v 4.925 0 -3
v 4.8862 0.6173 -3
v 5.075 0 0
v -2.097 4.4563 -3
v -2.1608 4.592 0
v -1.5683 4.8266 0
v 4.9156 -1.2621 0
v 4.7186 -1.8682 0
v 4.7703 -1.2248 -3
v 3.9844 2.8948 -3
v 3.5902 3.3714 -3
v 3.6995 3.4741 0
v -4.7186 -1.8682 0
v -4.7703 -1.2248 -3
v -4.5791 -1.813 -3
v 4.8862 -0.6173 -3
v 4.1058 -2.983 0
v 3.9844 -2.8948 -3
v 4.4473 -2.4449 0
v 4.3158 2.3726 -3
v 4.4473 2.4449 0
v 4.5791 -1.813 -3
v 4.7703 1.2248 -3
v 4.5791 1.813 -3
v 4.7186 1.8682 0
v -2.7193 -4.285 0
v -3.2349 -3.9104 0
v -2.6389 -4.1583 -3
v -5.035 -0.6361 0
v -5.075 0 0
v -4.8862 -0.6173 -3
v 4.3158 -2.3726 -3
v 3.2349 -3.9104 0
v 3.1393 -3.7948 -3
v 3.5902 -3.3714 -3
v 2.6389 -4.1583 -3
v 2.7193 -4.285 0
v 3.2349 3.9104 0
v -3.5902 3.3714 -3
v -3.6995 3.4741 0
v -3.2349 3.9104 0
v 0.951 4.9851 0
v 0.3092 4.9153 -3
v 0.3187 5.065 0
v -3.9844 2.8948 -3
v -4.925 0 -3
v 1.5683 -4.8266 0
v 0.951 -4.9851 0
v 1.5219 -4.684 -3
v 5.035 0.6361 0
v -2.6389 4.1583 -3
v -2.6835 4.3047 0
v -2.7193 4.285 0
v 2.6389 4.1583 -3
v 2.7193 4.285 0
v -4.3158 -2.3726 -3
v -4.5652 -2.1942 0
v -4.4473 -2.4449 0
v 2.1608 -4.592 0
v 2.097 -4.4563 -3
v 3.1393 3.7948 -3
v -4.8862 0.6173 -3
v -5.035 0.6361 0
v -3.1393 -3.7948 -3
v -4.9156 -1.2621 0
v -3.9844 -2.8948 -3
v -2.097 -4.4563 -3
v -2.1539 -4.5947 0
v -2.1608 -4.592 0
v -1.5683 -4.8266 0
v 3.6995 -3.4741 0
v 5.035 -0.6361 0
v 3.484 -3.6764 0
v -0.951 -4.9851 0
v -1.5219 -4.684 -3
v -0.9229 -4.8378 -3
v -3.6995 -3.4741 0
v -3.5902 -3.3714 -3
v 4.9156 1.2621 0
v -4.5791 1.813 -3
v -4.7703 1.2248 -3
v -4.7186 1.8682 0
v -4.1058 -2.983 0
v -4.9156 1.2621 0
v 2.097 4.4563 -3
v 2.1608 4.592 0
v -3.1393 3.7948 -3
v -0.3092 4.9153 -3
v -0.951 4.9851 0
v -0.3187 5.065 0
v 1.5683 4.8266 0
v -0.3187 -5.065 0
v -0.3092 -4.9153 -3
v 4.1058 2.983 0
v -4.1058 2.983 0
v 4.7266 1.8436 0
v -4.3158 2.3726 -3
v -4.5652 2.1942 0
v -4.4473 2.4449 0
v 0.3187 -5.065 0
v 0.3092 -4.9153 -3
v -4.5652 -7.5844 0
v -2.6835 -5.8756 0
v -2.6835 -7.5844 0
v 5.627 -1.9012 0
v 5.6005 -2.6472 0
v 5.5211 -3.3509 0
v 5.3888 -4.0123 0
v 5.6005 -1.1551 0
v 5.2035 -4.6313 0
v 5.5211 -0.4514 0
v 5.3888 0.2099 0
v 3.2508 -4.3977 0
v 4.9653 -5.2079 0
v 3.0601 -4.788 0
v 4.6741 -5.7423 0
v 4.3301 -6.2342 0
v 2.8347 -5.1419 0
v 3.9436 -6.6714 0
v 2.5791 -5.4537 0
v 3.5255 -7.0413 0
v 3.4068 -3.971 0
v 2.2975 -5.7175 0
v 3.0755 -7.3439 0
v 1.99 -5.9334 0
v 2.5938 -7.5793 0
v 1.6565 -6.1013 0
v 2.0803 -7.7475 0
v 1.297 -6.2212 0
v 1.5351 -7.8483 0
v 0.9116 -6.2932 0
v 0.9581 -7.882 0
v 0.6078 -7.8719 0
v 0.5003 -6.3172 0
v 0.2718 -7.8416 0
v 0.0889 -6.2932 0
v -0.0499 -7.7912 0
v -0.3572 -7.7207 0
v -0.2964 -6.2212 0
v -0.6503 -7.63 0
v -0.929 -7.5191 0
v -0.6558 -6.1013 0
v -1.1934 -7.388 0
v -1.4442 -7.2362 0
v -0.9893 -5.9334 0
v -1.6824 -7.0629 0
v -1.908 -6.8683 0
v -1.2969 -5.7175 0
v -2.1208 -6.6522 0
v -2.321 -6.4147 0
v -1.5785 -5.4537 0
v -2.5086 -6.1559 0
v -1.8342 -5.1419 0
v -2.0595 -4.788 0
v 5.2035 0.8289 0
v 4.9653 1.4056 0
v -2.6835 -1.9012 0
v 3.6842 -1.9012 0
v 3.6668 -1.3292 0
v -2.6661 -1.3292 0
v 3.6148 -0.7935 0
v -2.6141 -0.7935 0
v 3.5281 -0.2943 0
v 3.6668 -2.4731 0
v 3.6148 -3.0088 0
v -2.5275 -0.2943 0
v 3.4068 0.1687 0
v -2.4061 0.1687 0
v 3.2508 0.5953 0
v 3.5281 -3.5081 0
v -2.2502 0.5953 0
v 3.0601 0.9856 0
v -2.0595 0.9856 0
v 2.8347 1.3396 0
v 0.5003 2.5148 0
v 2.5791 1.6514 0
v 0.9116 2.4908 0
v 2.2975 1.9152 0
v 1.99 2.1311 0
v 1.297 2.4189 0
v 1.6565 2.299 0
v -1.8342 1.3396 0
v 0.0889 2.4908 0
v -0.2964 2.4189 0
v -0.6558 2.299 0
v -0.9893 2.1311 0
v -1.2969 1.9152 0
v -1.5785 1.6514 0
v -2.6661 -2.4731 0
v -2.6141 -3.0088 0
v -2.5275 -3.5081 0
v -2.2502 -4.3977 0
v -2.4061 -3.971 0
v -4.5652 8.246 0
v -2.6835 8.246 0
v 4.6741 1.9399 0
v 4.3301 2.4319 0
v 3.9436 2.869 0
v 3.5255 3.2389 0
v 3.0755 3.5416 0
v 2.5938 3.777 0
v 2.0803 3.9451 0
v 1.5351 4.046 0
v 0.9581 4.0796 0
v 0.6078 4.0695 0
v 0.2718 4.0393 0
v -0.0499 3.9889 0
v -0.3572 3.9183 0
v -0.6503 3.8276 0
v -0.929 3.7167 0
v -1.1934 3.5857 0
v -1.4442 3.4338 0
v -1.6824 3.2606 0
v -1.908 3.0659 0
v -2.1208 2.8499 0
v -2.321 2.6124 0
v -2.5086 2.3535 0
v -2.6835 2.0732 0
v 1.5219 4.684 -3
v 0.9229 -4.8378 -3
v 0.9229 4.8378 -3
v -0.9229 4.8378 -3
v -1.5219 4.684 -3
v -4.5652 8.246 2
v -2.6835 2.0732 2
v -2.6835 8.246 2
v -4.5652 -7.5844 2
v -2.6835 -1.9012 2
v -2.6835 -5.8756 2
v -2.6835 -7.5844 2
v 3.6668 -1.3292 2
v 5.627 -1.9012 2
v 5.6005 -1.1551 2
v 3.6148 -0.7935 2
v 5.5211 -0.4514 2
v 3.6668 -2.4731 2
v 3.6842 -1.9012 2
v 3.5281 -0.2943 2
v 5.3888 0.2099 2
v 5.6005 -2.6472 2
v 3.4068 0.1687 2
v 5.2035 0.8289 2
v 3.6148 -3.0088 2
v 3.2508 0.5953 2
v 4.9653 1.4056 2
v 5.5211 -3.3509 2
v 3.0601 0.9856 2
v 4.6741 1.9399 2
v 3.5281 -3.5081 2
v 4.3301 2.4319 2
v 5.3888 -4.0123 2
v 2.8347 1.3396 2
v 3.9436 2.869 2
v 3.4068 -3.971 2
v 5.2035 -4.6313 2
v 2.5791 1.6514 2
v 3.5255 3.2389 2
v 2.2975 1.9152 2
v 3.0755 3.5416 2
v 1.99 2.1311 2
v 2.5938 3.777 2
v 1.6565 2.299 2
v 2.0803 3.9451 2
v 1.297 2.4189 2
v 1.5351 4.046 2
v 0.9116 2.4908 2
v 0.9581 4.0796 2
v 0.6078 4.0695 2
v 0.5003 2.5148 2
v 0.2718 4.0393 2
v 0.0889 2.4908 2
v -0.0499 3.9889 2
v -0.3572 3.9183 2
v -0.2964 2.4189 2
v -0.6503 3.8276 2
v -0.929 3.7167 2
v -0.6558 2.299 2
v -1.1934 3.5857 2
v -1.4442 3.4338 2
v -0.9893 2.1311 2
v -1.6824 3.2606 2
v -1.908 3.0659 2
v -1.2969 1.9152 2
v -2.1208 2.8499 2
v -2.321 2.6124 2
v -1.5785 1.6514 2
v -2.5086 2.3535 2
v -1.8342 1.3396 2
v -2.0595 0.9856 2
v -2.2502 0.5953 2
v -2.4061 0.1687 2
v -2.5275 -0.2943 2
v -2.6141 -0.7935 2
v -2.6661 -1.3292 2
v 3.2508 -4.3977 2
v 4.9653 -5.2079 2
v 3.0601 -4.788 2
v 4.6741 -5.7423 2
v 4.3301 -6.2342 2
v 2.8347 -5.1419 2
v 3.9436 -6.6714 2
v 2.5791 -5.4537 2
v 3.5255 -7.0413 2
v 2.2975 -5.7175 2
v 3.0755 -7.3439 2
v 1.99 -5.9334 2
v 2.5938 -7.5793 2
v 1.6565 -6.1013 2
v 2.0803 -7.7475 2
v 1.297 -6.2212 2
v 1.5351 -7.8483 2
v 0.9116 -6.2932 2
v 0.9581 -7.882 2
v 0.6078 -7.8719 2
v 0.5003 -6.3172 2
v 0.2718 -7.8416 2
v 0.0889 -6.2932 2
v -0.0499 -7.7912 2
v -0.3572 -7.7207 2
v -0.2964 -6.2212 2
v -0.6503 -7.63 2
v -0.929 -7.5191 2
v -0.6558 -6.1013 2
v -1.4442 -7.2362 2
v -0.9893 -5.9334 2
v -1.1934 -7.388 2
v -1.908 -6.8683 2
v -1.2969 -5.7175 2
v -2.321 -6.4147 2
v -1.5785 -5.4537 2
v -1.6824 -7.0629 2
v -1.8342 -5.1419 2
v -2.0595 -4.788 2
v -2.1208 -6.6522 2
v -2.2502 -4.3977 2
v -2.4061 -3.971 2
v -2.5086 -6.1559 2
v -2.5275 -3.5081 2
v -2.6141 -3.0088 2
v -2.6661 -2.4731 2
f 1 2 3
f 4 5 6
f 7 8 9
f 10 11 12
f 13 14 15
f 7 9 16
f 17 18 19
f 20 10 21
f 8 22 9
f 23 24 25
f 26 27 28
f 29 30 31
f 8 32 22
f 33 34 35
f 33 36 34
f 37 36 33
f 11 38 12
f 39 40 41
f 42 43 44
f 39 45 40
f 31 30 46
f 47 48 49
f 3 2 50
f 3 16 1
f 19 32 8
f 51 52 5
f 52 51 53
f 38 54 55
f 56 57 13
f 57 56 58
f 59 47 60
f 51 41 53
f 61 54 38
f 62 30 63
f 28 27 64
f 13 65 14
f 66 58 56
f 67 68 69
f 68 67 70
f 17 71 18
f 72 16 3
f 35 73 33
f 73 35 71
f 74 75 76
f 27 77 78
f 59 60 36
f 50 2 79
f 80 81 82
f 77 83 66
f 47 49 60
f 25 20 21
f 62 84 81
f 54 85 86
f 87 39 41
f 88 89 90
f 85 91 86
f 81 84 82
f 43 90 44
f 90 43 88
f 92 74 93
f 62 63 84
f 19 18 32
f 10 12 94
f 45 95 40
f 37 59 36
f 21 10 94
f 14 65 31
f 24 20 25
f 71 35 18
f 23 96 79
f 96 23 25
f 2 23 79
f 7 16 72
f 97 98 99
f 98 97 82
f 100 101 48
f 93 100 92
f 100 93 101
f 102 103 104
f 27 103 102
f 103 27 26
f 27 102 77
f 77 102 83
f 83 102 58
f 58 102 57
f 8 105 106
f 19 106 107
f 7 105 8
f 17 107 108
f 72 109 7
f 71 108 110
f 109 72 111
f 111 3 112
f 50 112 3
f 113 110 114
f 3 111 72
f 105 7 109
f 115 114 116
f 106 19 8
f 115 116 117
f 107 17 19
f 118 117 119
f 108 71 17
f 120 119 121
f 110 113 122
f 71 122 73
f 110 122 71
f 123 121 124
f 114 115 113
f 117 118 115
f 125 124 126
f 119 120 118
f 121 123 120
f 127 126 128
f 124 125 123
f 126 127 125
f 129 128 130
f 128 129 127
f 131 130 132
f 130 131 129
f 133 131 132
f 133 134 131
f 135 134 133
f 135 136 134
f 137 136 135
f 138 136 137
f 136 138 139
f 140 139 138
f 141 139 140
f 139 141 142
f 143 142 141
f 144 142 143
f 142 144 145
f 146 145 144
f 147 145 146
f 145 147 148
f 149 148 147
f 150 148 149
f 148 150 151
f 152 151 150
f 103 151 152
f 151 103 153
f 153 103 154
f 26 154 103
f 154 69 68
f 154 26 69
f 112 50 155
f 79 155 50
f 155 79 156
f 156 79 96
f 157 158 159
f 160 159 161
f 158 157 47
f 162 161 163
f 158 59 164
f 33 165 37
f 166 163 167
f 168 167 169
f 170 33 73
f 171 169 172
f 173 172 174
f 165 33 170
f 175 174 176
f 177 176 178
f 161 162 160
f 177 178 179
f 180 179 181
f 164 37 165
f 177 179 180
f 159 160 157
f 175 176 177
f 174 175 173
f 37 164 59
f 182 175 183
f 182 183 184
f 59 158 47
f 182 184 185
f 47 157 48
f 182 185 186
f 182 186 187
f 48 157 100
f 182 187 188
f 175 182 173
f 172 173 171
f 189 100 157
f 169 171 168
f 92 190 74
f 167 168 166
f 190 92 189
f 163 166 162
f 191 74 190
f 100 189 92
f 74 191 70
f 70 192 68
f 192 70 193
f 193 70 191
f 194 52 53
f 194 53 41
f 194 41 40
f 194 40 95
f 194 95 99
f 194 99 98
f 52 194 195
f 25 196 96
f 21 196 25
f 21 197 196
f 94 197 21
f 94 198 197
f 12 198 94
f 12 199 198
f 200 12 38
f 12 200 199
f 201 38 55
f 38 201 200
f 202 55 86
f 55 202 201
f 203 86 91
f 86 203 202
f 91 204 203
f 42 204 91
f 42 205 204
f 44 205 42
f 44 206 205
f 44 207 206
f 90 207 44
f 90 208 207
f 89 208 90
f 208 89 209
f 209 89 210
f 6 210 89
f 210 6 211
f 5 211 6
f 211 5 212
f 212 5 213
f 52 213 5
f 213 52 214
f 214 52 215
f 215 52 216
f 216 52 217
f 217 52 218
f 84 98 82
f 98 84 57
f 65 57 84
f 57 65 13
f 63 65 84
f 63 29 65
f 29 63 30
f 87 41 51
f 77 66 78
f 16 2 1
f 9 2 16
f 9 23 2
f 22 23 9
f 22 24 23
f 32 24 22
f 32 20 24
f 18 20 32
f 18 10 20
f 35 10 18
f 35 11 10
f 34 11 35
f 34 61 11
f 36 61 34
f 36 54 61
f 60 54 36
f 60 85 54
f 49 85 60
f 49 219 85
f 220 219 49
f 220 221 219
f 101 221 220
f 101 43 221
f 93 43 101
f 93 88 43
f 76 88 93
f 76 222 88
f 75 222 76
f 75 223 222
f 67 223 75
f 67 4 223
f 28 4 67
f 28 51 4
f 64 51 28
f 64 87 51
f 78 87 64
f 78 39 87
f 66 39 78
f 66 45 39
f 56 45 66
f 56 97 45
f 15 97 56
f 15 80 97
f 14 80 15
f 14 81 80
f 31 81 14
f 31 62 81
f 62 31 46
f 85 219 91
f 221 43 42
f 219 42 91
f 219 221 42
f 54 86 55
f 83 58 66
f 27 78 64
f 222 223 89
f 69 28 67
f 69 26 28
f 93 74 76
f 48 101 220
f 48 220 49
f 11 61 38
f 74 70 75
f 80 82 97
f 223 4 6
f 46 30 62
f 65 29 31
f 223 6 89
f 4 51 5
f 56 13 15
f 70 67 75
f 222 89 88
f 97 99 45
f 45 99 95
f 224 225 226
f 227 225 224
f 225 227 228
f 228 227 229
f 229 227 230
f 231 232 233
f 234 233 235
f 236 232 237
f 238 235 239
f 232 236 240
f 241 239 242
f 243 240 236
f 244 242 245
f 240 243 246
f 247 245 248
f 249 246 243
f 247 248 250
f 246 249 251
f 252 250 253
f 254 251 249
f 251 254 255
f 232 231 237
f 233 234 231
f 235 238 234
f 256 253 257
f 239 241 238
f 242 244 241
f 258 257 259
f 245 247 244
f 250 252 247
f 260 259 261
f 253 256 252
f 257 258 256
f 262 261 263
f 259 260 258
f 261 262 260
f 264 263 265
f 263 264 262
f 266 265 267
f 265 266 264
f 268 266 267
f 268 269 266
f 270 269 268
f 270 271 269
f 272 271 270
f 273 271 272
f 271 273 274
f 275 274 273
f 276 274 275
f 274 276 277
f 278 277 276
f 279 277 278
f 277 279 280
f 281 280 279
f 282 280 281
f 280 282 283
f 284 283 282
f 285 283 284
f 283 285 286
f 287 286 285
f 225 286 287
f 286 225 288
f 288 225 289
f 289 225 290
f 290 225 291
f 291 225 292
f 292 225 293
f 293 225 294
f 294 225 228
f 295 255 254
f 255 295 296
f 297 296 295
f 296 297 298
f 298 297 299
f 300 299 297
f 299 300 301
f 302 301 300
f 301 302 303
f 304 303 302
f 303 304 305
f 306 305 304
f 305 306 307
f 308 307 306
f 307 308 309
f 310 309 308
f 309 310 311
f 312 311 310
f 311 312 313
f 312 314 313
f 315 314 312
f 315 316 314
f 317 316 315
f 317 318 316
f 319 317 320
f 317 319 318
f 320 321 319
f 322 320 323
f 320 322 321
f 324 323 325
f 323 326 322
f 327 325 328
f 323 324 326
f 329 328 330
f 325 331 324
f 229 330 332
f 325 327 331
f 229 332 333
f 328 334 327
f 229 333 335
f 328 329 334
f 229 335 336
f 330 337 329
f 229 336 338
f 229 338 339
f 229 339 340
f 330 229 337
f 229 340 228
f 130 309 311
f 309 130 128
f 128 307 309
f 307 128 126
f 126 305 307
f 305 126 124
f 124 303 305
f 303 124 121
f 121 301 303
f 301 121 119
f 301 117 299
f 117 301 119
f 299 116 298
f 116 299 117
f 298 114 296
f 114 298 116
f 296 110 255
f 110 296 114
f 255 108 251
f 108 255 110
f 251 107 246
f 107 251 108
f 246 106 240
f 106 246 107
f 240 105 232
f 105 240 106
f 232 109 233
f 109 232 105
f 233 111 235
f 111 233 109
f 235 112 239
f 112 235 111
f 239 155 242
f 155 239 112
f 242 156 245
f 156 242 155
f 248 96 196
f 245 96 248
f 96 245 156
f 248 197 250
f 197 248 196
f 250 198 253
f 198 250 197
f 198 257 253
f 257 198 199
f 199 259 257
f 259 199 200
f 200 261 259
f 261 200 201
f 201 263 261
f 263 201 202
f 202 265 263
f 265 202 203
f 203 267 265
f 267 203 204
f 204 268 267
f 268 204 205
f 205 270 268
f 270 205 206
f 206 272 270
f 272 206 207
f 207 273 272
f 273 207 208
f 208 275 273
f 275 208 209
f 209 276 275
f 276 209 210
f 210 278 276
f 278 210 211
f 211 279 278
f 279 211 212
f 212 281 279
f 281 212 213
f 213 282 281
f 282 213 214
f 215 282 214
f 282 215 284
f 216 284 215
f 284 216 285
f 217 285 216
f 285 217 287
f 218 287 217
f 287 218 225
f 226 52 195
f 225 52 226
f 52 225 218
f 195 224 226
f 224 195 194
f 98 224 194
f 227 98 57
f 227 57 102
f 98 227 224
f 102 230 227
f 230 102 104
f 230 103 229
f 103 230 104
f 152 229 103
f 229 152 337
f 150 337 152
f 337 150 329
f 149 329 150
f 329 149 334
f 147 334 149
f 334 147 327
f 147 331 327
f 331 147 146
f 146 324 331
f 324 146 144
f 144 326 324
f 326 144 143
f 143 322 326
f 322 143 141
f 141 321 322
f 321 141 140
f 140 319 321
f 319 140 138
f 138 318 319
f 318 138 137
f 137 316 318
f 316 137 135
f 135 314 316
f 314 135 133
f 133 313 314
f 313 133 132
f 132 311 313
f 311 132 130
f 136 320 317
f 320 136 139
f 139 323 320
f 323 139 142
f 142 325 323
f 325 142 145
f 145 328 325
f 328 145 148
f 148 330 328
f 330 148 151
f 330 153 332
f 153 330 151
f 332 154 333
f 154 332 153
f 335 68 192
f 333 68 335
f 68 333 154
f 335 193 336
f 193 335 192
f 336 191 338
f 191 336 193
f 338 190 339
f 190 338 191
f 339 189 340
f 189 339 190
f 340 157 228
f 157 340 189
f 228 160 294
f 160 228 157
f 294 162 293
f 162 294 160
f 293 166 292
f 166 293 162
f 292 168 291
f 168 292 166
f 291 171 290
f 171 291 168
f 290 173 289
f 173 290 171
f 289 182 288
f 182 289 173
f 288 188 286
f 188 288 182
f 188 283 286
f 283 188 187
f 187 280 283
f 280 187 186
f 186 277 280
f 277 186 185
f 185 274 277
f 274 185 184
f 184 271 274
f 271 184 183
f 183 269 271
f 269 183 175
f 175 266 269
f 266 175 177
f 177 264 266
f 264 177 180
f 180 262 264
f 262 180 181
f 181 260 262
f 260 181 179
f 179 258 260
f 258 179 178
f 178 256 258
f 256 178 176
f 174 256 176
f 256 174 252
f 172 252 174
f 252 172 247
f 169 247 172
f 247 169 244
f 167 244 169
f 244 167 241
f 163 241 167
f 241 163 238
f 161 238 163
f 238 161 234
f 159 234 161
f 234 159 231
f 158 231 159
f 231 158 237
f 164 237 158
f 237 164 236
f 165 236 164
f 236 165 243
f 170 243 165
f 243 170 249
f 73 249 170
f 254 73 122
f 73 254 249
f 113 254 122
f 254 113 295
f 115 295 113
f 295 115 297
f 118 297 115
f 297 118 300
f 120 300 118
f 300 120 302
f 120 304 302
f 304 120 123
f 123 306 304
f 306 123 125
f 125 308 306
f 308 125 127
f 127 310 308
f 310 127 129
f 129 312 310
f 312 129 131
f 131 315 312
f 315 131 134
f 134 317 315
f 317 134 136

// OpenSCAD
$fn = 50;

difference() {
	union() {
		translate(v = [0, 0, -3.0]) {
			cylinder(h = 3, r1 = 4.925, r2 = 5.075);
		}
		linear_extrude(height = 2) {
			text(font = "Webdings", halign = "center", size = 15, text = "b", valign = "center");
		}
	}
	union();
}
